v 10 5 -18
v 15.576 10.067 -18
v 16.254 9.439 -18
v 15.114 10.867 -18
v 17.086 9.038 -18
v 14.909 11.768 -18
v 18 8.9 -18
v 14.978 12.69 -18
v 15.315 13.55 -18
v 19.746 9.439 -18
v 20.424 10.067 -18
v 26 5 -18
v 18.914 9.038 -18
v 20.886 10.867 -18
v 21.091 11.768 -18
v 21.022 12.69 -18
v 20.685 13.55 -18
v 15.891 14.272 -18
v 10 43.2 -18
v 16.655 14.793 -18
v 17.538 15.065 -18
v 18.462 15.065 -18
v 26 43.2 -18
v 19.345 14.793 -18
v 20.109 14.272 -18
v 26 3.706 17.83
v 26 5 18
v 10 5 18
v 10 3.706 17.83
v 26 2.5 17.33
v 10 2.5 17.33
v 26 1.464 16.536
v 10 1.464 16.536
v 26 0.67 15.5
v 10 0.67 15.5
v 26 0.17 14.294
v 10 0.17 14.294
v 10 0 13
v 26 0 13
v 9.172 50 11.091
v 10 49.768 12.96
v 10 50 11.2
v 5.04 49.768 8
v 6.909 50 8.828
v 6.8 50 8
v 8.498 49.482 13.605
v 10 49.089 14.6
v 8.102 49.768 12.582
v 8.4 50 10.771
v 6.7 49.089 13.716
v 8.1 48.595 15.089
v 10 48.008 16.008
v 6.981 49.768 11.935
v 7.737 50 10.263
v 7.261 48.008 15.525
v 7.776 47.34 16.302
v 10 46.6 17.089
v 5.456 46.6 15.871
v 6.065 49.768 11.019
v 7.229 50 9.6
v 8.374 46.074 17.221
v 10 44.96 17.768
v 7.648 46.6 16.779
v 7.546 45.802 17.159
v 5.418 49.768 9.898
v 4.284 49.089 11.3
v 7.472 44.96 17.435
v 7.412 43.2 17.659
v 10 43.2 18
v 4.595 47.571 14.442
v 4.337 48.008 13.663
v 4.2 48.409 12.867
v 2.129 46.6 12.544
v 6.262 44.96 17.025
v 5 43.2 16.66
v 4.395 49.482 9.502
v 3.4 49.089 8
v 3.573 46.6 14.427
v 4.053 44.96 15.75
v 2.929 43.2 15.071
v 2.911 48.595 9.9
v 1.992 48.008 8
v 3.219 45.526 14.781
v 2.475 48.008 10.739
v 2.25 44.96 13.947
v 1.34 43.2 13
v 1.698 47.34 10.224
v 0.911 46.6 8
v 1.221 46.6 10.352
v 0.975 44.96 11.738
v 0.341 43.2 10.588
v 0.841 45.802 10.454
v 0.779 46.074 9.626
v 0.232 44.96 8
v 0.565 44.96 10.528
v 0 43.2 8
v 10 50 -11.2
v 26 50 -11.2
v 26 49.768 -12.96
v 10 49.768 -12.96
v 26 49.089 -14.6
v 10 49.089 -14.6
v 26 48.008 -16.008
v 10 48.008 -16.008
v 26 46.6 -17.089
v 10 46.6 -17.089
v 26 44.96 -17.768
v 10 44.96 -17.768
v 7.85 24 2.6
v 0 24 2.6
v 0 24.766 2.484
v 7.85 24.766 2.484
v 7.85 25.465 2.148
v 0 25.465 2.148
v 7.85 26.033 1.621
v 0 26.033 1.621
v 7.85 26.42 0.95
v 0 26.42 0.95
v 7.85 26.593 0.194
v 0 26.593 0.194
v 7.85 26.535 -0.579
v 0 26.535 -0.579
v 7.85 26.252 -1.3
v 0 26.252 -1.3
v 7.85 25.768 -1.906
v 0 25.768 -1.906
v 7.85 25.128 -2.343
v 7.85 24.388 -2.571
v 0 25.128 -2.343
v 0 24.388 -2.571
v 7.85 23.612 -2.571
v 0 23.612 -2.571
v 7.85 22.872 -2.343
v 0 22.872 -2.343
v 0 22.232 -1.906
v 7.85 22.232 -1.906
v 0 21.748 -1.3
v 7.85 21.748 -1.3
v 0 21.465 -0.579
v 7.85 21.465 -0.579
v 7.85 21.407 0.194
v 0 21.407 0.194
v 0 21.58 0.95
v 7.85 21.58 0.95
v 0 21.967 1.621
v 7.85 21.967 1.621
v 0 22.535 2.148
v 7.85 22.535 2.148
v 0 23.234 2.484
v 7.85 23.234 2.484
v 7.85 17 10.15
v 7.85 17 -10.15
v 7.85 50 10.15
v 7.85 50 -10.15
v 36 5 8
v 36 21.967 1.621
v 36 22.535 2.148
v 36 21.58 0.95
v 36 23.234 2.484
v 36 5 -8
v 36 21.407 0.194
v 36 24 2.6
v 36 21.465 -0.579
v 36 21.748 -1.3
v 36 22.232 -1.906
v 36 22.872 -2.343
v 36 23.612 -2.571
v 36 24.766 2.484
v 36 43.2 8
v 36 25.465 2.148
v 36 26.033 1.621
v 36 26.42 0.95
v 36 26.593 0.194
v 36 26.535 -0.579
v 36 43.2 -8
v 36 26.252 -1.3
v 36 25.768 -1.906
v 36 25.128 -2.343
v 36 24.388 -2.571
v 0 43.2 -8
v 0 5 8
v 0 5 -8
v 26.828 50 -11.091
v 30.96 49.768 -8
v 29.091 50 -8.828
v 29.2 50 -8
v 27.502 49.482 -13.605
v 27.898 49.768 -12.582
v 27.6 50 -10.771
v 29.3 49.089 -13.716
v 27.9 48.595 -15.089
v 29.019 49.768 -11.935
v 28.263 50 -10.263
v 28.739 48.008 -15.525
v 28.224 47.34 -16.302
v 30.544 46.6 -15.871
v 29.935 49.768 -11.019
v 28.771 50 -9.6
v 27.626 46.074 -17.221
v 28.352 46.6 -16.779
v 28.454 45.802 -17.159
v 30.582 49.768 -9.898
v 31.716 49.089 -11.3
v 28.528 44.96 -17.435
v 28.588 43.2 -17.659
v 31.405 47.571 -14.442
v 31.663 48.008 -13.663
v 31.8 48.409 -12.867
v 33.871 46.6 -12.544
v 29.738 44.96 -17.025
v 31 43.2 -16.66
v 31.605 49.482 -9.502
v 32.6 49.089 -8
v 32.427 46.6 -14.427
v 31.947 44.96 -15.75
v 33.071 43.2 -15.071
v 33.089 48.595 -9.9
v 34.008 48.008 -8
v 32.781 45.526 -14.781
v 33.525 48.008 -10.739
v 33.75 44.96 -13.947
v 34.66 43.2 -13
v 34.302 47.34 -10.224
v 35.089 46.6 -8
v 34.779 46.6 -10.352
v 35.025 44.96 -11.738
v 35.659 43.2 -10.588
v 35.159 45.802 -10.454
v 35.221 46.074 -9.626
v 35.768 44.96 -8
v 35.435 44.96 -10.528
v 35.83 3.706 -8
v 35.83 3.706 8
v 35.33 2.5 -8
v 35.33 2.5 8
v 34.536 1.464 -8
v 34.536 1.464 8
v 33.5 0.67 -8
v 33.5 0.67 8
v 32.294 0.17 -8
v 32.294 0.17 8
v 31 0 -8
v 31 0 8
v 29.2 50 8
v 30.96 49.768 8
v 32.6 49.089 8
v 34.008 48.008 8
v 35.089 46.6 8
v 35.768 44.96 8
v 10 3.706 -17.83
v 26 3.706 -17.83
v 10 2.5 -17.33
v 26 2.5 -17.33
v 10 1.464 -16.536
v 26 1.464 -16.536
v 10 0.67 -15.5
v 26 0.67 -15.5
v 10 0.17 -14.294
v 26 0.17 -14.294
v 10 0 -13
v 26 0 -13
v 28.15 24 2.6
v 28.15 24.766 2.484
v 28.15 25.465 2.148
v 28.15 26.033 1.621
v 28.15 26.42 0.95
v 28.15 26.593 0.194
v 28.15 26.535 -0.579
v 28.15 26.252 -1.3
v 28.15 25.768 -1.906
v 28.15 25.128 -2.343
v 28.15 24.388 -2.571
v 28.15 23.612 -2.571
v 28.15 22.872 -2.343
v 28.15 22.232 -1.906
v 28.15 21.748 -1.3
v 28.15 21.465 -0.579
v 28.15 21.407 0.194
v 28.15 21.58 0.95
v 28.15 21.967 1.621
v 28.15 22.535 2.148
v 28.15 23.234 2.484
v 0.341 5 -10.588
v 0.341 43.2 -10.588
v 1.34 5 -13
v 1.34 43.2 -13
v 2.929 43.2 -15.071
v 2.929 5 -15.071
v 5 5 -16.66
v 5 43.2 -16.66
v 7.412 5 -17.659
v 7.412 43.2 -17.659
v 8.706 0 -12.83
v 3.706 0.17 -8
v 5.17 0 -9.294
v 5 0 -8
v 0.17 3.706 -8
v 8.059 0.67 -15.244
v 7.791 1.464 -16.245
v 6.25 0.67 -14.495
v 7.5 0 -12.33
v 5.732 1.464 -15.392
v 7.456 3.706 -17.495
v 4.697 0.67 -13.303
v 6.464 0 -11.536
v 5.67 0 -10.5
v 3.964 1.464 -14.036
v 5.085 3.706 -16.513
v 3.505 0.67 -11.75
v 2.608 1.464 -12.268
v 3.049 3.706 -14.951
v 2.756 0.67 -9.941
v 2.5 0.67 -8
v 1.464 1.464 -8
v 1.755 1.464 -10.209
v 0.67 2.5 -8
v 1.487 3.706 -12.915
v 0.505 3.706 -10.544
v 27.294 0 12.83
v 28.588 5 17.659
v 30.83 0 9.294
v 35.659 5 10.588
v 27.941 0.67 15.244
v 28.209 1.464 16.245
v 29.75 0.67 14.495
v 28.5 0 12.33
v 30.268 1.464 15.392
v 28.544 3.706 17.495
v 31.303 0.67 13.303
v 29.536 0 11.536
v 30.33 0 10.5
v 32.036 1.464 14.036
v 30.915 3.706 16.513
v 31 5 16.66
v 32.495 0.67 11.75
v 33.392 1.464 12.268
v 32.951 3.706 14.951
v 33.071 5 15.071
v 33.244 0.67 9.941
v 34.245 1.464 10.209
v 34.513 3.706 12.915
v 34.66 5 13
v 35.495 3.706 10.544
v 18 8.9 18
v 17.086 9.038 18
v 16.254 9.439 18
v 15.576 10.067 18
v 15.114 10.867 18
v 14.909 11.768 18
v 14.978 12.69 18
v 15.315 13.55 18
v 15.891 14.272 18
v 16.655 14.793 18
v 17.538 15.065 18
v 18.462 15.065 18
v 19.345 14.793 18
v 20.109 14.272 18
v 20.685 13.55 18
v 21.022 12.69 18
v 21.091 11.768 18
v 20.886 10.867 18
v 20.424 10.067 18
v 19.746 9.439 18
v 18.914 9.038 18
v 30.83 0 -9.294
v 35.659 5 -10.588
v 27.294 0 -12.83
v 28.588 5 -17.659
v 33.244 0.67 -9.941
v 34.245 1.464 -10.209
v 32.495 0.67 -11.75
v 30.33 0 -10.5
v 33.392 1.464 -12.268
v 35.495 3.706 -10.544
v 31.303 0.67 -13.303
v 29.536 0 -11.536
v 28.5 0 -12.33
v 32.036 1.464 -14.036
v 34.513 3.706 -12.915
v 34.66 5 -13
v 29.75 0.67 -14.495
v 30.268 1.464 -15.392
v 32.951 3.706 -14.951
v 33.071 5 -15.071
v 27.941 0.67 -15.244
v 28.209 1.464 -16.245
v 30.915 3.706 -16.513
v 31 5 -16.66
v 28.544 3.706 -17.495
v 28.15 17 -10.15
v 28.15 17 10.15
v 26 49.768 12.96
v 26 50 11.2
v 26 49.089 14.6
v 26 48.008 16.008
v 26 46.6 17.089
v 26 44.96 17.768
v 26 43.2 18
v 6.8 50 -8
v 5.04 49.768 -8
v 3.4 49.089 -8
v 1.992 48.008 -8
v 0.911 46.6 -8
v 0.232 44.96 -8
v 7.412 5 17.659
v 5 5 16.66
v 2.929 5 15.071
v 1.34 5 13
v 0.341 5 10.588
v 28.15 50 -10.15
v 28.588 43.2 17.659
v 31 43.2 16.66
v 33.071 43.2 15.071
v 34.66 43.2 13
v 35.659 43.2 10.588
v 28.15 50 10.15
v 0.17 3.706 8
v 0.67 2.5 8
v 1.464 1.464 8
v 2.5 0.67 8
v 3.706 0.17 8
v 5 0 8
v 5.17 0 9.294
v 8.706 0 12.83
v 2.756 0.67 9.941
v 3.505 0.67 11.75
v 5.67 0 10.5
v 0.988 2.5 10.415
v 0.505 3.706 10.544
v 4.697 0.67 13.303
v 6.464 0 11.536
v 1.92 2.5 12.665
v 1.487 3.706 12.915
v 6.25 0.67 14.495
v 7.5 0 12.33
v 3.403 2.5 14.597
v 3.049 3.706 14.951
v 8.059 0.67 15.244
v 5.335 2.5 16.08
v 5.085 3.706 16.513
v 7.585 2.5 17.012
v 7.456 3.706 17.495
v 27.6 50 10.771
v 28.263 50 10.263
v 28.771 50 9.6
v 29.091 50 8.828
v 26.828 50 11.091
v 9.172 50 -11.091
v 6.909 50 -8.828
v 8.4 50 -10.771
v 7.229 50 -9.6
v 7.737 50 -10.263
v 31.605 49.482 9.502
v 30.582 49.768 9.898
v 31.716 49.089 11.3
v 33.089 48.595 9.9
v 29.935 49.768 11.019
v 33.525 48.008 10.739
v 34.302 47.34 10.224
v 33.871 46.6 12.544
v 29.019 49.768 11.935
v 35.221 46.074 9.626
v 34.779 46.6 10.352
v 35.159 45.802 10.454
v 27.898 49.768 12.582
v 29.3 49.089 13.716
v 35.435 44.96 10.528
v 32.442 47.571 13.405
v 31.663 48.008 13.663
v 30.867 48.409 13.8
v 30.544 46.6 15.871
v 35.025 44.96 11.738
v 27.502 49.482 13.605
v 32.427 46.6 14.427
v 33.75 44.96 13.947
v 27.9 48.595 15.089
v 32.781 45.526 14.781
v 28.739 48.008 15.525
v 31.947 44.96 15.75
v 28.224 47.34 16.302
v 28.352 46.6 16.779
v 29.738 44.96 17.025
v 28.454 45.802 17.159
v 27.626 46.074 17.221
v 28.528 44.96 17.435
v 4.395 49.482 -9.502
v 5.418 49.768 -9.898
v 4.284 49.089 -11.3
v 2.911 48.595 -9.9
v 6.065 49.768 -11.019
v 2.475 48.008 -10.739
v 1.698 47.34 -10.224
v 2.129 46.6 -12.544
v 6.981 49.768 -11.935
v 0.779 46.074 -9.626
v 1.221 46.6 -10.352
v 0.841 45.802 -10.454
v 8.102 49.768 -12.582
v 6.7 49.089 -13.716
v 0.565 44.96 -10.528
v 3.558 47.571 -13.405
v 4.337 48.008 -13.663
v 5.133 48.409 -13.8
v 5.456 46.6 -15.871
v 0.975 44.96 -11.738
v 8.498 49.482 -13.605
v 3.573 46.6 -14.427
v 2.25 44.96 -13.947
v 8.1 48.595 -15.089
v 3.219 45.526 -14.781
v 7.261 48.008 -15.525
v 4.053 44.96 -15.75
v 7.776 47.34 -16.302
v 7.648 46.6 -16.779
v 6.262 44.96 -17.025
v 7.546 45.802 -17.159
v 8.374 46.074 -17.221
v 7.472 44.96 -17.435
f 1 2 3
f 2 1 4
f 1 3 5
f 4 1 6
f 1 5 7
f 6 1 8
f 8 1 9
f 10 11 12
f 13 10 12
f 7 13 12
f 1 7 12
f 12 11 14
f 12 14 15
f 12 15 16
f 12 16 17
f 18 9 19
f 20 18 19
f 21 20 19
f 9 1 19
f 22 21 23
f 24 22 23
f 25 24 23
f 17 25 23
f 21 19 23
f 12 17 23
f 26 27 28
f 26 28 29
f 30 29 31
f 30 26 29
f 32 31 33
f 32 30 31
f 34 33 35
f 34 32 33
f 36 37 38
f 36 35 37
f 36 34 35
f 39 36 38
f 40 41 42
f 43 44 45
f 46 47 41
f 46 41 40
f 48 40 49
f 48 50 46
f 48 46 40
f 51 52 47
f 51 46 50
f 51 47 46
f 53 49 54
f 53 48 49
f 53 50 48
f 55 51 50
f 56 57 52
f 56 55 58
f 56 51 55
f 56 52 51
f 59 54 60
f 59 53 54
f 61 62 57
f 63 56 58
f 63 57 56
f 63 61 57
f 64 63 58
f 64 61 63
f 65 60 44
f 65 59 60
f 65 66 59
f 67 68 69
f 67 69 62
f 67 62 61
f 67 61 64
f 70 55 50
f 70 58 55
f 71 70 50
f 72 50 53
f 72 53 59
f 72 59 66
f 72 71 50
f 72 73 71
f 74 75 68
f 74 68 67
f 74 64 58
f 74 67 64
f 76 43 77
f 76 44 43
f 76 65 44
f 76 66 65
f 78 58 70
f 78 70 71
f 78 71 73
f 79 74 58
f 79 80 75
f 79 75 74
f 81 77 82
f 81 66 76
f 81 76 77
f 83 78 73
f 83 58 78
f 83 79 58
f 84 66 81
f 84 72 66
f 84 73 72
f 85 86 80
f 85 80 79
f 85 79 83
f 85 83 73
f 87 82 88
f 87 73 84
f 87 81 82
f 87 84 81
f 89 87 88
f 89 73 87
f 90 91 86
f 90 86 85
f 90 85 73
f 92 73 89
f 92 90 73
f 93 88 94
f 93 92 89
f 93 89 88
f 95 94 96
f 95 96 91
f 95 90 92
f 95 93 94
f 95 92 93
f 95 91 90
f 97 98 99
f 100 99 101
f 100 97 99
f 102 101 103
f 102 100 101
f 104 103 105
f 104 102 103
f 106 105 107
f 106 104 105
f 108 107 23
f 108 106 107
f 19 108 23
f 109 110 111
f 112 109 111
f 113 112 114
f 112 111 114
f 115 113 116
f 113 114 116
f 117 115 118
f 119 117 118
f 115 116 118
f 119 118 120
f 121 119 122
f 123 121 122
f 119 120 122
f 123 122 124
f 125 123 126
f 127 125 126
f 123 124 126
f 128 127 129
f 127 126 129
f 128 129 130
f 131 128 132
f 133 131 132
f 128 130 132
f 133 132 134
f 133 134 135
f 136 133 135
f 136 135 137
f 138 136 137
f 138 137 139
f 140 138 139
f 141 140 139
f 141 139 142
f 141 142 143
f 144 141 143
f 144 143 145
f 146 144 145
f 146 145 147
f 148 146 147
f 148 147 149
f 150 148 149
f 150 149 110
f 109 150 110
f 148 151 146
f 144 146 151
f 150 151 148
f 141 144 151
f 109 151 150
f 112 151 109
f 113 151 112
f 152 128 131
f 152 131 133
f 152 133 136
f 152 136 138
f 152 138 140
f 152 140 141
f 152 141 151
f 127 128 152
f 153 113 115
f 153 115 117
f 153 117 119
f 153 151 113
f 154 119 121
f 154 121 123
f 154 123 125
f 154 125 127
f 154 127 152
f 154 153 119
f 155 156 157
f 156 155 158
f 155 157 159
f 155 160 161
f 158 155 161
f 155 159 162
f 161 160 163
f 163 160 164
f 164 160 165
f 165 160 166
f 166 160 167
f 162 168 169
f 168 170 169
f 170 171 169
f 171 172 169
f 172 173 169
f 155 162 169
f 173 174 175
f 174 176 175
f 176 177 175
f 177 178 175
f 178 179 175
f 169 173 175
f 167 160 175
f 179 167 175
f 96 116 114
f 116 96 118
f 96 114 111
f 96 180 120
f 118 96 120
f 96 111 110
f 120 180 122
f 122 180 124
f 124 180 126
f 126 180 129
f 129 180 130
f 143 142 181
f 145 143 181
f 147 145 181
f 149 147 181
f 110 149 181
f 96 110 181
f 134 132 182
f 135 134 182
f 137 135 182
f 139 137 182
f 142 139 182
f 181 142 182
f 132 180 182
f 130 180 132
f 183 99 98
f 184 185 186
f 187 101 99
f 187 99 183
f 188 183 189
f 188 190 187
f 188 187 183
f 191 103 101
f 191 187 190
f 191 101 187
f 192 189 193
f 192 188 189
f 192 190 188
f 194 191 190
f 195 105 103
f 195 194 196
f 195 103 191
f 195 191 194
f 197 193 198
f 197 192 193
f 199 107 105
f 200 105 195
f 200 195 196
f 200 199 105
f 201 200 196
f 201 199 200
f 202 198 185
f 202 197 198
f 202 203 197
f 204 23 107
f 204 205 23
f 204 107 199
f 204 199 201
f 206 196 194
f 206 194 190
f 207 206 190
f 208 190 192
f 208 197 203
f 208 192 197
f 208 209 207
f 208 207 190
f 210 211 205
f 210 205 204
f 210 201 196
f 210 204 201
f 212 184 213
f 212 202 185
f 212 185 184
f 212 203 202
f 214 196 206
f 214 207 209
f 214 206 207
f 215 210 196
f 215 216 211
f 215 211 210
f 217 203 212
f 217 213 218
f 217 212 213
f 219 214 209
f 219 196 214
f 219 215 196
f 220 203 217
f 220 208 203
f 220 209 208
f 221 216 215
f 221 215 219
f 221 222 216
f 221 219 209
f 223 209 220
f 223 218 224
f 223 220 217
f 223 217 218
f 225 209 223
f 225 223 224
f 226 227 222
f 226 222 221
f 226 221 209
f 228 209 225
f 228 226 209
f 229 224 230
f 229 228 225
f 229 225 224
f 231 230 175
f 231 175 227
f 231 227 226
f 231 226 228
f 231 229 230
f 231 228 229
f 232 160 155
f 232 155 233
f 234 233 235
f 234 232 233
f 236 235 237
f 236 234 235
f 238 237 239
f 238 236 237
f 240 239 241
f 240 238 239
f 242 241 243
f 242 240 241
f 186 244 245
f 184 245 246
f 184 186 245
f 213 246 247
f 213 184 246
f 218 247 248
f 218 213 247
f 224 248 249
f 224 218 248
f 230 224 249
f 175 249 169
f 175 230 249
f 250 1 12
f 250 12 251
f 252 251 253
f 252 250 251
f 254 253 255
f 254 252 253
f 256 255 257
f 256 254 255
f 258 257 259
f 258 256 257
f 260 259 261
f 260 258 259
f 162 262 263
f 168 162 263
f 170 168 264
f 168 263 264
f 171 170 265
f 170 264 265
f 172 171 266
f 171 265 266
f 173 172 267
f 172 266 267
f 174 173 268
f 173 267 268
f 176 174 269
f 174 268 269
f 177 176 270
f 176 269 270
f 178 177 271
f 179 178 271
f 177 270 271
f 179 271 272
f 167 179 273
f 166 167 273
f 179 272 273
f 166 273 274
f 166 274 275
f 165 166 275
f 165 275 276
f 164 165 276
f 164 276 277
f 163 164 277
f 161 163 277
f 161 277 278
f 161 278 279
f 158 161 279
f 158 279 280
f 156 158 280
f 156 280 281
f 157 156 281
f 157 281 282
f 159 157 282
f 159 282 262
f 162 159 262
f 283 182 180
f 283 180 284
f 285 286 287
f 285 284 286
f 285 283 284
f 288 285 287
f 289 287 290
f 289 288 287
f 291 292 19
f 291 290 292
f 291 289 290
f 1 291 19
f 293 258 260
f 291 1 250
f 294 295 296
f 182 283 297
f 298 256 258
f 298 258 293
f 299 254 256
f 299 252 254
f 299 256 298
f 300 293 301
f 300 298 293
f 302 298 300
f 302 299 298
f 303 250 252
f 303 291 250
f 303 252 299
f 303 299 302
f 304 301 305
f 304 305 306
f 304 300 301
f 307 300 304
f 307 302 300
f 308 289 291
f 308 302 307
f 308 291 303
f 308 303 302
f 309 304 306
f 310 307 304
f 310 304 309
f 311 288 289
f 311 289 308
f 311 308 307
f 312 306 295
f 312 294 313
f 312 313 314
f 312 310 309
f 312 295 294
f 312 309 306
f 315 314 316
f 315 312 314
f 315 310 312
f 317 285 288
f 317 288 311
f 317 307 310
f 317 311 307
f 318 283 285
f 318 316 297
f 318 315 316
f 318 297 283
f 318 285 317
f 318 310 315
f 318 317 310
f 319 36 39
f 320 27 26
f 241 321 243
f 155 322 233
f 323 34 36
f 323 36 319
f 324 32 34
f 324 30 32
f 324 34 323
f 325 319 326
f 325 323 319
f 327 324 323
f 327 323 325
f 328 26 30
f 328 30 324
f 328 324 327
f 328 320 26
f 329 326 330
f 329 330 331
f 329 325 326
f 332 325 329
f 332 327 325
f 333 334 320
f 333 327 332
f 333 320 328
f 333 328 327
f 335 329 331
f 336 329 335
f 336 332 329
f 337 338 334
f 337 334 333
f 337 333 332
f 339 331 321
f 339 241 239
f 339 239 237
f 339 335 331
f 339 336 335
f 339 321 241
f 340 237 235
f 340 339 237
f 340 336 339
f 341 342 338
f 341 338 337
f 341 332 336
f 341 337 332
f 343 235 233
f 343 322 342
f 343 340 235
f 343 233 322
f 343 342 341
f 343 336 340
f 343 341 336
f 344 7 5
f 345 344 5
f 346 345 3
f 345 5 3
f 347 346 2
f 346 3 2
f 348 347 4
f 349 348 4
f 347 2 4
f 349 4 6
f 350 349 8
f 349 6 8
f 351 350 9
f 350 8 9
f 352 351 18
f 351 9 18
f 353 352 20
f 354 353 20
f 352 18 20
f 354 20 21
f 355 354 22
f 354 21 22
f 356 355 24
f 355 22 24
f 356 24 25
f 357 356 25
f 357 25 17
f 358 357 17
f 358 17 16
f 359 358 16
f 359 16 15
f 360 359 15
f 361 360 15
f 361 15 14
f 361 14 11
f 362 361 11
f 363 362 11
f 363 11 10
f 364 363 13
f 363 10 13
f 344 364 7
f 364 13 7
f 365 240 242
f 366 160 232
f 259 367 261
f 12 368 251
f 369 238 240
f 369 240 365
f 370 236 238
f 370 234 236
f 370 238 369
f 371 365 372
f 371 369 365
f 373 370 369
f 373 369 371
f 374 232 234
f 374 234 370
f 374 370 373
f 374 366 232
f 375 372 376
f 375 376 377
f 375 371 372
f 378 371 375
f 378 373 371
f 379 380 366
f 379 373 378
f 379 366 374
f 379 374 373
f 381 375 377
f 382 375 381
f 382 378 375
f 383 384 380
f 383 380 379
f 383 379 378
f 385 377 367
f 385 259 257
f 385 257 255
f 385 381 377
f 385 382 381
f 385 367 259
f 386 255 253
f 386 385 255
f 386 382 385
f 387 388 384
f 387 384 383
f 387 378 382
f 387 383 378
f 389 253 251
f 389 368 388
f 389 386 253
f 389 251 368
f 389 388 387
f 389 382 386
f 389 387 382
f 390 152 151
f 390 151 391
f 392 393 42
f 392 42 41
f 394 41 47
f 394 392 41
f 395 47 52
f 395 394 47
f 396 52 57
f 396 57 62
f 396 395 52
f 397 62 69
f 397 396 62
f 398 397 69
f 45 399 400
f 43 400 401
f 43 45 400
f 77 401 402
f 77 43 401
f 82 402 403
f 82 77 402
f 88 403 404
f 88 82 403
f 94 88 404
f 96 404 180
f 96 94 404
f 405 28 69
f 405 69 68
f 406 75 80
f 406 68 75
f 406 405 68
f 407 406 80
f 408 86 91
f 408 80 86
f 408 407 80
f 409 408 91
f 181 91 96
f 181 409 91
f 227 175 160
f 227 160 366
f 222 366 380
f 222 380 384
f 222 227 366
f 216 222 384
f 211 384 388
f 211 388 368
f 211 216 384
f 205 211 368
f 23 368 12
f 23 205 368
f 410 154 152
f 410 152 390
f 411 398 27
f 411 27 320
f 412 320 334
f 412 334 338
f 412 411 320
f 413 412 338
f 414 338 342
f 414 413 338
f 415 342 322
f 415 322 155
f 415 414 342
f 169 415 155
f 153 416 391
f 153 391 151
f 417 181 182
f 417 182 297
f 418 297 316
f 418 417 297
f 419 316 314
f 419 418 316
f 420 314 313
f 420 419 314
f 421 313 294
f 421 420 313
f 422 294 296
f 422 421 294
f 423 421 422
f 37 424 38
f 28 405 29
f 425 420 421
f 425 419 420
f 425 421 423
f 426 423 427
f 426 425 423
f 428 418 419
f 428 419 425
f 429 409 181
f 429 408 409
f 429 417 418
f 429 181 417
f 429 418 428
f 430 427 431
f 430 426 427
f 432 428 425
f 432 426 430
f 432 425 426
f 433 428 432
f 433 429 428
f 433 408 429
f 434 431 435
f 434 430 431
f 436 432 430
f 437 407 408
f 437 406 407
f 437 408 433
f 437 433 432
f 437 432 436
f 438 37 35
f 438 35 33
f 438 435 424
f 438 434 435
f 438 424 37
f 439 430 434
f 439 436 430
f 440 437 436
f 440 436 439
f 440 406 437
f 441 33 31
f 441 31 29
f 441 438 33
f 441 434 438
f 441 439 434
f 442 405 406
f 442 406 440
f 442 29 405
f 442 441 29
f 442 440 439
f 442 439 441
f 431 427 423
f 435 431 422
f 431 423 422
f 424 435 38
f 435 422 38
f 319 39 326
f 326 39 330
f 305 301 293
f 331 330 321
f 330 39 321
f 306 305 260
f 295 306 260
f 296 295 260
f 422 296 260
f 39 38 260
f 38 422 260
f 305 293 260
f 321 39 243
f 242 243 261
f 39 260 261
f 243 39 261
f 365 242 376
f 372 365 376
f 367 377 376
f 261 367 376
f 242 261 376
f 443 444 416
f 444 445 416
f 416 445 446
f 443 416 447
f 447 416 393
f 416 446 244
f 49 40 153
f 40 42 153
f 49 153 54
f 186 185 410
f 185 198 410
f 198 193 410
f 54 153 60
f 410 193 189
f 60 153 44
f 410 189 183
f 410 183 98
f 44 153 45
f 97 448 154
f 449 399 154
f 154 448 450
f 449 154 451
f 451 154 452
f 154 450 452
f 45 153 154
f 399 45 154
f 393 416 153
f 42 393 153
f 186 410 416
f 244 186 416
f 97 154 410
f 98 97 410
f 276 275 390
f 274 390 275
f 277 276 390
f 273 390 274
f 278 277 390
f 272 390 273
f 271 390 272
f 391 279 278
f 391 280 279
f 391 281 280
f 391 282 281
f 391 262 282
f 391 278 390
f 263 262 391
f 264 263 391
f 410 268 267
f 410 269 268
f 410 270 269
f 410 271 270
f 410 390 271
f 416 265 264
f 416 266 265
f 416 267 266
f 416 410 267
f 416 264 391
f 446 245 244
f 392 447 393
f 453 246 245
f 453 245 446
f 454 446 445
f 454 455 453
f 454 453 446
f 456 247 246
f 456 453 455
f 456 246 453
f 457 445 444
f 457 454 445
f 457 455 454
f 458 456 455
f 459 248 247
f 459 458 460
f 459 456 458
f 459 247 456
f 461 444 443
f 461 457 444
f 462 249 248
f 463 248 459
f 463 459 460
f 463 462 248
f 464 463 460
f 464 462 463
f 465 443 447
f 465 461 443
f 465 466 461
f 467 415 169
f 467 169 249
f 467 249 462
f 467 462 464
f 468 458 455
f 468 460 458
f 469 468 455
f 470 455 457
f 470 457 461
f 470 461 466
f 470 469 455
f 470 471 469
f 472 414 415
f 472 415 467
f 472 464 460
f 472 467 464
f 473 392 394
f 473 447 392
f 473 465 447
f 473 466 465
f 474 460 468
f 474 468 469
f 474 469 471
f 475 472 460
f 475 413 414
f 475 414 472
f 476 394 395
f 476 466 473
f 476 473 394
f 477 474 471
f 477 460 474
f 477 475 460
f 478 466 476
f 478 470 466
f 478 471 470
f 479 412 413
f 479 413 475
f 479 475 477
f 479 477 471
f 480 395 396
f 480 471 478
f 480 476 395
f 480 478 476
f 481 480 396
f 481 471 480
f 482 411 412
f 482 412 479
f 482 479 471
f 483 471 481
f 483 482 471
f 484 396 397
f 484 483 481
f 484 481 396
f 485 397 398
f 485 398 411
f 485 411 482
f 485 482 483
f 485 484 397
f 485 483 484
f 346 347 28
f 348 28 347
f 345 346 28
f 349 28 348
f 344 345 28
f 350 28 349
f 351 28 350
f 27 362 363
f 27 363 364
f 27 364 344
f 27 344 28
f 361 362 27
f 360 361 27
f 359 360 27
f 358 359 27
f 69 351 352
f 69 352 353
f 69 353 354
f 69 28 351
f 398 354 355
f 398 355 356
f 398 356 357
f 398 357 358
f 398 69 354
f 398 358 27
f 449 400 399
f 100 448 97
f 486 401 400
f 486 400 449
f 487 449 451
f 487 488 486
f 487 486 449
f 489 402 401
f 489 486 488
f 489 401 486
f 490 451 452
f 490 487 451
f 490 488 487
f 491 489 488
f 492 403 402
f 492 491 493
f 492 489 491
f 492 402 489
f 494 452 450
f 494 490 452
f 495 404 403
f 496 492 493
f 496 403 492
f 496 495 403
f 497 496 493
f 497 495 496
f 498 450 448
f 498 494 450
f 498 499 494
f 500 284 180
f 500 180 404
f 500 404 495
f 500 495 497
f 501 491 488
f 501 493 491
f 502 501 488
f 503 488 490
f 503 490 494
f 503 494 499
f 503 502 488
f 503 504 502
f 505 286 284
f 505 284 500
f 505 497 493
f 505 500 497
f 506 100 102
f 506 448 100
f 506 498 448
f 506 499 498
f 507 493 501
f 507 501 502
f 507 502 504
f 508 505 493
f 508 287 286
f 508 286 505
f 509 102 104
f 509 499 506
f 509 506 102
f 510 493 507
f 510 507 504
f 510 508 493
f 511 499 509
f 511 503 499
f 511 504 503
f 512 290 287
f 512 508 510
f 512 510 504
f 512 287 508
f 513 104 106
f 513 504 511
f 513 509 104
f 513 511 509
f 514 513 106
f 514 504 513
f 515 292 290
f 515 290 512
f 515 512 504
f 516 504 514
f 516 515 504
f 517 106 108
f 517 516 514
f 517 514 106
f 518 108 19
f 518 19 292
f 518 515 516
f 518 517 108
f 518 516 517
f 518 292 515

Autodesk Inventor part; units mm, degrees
ref_plane "YZ Plane" through (0, 0, 0) normal (1, 0, 0) x (0, 1, 0)
ref_plane "XZ Plane" through (0, 0, 0) normal (0, 1, 0) x (-1, 0, 0)
ref_plane "XY Plane" through (0, 0, 0) normal (0, 0, 1) x (1, 0, 0)
sketch "Sketch1" plane through (0, 0, 0) normal (0, 0, 1) x (1, 0, 0)
  line L0 (0, 0) -> (36, 0)
  line L1 (36, 0) -> (36, 50)
  line L2 (36, 50) -> (0, 50)
  line L3 (0, 50) -> (0, 0)
  dimension "d0" = 36
  dimension "d1" = 50
extrude "Extrusion1" add sketch "Sketch1" along normal mid plane 36
sketch "Sketch2" plane through (0, 50, 18) normal (0, 1, 0) x (1, 0, 0)
  line L0 (28.15, 7.85) -> (7.85, 7.85)
  line L1 (7.85, 7.85) -> (7.85, 28.15)
  line L2 (7.85, 28.15) -> (28.15, 28.15)
  line L3 (28.15, 28.15) -> (28.15, 7.85)
  line L4 (28.15, 7.85) -> (7.85, 28.15) construction
  line L5 (7.85, 7.85) -> (28.15, 28.15) construction
  line L6 (0, 36) -> (0, 0) projected
  point P0 (0, 18)
  point P1 (18, 18)
  point P2 (0, 18)
  dimension "d4" = 18
  dimension "d5" = 20.3
  dimension "d6" = 20.3
extrude "Extrusion2" cut sketch "Sketch2" against normal blind 33
sketch "Sketch3" plane through (0, 0, 18) normal (0, 0, 1) x (1, 0, 0)
  line L0 (0, 50) -> (0, 0) projected
  line L1 (0, 0) -> (36, 0) projected
  point P0 (18, 12)
  dimension "d9" = 18
  dimension "d10" = 12
hole "Hole1" at (18, 12, 18) direction (0, 0, -1) diameter 6.2 end through all
sketch "Sketch8" plane through (7.85, 50, -10.15) normal (0, 0, 1) x (1, 0, 0)
  point P0 (-7.85, -50)
sketch "Sketch11" plane through (0, 0, 18) normal (-1, 0, 0) x (0, 0, 1)
  circle A0 centre (-18, 24) radius 2.6
  line L0 (0, 50) -> (0, 0) projected
  line L1 (-7.85, 17) -> (-28.15, 17) projected
  point P0 (-18, 0)
  dimension "d41" = 5.2
  dimension "d42" = 18
  dimension "d43" = 7
extrude "Extrusion6" cut sketch "Sketch11" against normal through all
fillet "Fillet1" radius 10 4 edges at (36, 25, 18) (0, 25, 18) (0, 25, -18) (36, 25, -18)
fillet "Fillet2" radius 5 8 edges at (18, 0, 18) (33.0711, 0, 15.0711) (36, 0, 0) (33.0711, 0, -15.0711) (18, 0, -18) (2.9289, 0, -15.0711) (0, 0, 0) (2.9289, 0, 15.0711)
fillet "Fillet3" radius 6.8 8 edges at (33.0711, 50, 15.0711) (18, 50, 18) (2.9289, 50, 15.0711) (0, 50, 0) (2.9289, 50, -15.0711) (18, 50, -18) (33.0711, 50, -15.0711) (36, 50, 0)
properties part number "arm_collar"
